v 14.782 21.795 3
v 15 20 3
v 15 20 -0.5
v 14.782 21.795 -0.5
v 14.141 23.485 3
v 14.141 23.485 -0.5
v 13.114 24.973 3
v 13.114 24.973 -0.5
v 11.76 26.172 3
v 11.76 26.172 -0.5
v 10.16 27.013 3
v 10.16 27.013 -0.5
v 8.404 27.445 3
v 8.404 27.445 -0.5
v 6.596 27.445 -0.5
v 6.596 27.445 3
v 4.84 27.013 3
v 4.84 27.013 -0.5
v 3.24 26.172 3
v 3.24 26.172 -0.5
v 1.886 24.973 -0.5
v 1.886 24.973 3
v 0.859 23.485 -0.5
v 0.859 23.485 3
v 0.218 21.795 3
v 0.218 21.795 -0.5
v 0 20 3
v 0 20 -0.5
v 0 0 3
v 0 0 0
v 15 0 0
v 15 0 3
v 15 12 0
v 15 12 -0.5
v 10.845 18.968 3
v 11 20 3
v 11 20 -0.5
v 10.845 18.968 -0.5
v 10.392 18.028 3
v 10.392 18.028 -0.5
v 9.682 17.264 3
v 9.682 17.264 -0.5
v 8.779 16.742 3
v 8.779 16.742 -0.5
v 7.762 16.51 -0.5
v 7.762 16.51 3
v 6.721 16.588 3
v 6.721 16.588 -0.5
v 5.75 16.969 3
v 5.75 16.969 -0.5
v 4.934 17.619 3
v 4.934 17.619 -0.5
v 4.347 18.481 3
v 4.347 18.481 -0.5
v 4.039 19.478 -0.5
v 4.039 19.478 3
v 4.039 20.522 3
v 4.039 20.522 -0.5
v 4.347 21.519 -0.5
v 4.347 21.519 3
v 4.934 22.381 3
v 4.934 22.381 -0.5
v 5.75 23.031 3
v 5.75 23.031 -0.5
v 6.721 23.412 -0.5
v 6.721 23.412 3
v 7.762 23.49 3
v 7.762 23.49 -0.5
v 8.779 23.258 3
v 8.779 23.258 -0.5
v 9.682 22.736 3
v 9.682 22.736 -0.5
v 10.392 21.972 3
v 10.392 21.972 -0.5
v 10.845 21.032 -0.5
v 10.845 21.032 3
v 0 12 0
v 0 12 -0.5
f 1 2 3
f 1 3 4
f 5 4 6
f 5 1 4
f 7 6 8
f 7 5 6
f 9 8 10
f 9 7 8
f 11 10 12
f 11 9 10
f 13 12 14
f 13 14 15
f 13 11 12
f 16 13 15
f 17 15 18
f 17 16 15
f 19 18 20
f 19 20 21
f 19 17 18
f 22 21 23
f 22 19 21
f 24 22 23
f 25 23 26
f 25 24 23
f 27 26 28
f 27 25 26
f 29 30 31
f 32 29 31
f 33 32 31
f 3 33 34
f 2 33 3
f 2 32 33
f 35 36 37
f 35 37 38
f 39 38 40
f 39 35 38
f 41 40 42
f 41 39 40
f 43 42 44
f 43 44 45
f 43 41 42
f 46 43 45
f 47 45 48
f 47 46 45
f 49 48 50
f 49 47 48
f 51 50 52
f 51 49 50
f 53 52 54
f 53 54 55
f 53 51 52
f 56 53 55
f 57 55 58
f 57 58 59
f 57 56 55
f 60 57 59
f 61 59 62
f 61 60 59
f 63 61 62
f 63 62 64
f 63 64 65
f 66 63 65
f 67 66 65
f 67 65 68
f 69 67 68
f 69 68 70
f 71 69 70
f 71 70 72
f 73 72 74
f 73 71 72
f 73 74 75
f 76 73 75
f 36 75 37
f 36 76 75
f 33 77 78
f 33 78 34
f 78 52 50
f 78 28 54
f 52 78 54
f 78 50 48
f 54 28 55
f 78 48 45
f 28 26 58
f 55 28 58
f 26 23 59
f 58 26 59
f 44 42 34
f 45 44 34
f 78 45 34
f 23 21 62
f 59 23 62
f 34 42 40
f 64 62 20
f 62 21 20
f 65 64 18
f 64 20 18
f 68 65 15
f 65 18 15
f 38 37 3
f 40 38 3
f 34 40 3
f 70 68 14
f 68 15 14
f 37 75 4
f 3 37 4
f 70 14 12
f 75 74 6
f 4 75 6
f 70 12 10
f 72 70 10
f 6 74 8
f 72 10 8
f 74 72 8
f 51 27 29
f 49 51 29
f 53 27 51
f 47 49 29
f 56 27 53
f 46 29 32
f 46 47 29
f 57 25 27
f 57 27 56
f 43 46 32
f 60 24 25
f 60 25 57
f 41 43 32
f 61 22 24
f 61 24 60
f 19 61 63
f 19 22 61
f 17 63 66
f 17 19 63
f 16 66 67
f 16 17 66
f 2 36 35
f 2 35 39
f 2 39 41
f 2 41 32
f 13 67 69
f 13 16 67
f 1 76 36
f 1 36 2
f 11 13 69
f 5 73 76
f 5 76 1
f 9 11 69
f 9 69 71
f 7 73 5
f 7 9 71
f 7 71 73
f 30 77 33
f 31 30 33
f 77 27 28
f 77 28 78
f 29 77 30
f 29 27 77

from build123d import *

# Parameters (mm, degrees)
SKETCH1_W           = 15
SKETCH1_H           = 12
BOSS_EXTRUDE1_DEPTH = 3
BOSS_EXTRUDE2_DEPTH = 3.5


with BuildPart() as part:
    # Sketch1 → Boss-Extrude1 (new body)
    with BuildSketch(Plane.XY):
        with Locations((7.5, 6)):
            Rectangle(SKETCH1_W, SKETCH1_H)
    extrude(amount=BOSS_EXTRUDE1_DEPTH)

    # Sketch2 → Boss-Extrude2 (add)
    with BuildSketch(Plane.XY.offset(3)):
        with BuildLine():
            Line((0, 20), (0, 12))
            Line((0, 12), (15, 12))
            Line((15, 12), (15, 20))
            ThreePointArc((15, 20), (7.5, 12.5), (0, 20))
        make_face()
        with BuildLine():
            ThreePointArc((15, 20), (7.5, 27.5), (0, 20))
            Line((0, 20), (4, 20))
            ThreePointArc((4, 20), (7.5, 23.5), (11, 20))
            Line((11, 20), (15, 20))
        make_face()
        with BuildLine():
            Line((4, 20), (0, 20))
            ThreePointArc((0, 20), (7.5, 12.5), (15, 20))
            Line((15, 20), (11, 20))
            ThreePointArc((11, 20), (7.5, 16.5), (4, 20))
        make_face()
    extrude(amount=-BOSS_EXTRUDE2_DEPTH)


solid = part.part
